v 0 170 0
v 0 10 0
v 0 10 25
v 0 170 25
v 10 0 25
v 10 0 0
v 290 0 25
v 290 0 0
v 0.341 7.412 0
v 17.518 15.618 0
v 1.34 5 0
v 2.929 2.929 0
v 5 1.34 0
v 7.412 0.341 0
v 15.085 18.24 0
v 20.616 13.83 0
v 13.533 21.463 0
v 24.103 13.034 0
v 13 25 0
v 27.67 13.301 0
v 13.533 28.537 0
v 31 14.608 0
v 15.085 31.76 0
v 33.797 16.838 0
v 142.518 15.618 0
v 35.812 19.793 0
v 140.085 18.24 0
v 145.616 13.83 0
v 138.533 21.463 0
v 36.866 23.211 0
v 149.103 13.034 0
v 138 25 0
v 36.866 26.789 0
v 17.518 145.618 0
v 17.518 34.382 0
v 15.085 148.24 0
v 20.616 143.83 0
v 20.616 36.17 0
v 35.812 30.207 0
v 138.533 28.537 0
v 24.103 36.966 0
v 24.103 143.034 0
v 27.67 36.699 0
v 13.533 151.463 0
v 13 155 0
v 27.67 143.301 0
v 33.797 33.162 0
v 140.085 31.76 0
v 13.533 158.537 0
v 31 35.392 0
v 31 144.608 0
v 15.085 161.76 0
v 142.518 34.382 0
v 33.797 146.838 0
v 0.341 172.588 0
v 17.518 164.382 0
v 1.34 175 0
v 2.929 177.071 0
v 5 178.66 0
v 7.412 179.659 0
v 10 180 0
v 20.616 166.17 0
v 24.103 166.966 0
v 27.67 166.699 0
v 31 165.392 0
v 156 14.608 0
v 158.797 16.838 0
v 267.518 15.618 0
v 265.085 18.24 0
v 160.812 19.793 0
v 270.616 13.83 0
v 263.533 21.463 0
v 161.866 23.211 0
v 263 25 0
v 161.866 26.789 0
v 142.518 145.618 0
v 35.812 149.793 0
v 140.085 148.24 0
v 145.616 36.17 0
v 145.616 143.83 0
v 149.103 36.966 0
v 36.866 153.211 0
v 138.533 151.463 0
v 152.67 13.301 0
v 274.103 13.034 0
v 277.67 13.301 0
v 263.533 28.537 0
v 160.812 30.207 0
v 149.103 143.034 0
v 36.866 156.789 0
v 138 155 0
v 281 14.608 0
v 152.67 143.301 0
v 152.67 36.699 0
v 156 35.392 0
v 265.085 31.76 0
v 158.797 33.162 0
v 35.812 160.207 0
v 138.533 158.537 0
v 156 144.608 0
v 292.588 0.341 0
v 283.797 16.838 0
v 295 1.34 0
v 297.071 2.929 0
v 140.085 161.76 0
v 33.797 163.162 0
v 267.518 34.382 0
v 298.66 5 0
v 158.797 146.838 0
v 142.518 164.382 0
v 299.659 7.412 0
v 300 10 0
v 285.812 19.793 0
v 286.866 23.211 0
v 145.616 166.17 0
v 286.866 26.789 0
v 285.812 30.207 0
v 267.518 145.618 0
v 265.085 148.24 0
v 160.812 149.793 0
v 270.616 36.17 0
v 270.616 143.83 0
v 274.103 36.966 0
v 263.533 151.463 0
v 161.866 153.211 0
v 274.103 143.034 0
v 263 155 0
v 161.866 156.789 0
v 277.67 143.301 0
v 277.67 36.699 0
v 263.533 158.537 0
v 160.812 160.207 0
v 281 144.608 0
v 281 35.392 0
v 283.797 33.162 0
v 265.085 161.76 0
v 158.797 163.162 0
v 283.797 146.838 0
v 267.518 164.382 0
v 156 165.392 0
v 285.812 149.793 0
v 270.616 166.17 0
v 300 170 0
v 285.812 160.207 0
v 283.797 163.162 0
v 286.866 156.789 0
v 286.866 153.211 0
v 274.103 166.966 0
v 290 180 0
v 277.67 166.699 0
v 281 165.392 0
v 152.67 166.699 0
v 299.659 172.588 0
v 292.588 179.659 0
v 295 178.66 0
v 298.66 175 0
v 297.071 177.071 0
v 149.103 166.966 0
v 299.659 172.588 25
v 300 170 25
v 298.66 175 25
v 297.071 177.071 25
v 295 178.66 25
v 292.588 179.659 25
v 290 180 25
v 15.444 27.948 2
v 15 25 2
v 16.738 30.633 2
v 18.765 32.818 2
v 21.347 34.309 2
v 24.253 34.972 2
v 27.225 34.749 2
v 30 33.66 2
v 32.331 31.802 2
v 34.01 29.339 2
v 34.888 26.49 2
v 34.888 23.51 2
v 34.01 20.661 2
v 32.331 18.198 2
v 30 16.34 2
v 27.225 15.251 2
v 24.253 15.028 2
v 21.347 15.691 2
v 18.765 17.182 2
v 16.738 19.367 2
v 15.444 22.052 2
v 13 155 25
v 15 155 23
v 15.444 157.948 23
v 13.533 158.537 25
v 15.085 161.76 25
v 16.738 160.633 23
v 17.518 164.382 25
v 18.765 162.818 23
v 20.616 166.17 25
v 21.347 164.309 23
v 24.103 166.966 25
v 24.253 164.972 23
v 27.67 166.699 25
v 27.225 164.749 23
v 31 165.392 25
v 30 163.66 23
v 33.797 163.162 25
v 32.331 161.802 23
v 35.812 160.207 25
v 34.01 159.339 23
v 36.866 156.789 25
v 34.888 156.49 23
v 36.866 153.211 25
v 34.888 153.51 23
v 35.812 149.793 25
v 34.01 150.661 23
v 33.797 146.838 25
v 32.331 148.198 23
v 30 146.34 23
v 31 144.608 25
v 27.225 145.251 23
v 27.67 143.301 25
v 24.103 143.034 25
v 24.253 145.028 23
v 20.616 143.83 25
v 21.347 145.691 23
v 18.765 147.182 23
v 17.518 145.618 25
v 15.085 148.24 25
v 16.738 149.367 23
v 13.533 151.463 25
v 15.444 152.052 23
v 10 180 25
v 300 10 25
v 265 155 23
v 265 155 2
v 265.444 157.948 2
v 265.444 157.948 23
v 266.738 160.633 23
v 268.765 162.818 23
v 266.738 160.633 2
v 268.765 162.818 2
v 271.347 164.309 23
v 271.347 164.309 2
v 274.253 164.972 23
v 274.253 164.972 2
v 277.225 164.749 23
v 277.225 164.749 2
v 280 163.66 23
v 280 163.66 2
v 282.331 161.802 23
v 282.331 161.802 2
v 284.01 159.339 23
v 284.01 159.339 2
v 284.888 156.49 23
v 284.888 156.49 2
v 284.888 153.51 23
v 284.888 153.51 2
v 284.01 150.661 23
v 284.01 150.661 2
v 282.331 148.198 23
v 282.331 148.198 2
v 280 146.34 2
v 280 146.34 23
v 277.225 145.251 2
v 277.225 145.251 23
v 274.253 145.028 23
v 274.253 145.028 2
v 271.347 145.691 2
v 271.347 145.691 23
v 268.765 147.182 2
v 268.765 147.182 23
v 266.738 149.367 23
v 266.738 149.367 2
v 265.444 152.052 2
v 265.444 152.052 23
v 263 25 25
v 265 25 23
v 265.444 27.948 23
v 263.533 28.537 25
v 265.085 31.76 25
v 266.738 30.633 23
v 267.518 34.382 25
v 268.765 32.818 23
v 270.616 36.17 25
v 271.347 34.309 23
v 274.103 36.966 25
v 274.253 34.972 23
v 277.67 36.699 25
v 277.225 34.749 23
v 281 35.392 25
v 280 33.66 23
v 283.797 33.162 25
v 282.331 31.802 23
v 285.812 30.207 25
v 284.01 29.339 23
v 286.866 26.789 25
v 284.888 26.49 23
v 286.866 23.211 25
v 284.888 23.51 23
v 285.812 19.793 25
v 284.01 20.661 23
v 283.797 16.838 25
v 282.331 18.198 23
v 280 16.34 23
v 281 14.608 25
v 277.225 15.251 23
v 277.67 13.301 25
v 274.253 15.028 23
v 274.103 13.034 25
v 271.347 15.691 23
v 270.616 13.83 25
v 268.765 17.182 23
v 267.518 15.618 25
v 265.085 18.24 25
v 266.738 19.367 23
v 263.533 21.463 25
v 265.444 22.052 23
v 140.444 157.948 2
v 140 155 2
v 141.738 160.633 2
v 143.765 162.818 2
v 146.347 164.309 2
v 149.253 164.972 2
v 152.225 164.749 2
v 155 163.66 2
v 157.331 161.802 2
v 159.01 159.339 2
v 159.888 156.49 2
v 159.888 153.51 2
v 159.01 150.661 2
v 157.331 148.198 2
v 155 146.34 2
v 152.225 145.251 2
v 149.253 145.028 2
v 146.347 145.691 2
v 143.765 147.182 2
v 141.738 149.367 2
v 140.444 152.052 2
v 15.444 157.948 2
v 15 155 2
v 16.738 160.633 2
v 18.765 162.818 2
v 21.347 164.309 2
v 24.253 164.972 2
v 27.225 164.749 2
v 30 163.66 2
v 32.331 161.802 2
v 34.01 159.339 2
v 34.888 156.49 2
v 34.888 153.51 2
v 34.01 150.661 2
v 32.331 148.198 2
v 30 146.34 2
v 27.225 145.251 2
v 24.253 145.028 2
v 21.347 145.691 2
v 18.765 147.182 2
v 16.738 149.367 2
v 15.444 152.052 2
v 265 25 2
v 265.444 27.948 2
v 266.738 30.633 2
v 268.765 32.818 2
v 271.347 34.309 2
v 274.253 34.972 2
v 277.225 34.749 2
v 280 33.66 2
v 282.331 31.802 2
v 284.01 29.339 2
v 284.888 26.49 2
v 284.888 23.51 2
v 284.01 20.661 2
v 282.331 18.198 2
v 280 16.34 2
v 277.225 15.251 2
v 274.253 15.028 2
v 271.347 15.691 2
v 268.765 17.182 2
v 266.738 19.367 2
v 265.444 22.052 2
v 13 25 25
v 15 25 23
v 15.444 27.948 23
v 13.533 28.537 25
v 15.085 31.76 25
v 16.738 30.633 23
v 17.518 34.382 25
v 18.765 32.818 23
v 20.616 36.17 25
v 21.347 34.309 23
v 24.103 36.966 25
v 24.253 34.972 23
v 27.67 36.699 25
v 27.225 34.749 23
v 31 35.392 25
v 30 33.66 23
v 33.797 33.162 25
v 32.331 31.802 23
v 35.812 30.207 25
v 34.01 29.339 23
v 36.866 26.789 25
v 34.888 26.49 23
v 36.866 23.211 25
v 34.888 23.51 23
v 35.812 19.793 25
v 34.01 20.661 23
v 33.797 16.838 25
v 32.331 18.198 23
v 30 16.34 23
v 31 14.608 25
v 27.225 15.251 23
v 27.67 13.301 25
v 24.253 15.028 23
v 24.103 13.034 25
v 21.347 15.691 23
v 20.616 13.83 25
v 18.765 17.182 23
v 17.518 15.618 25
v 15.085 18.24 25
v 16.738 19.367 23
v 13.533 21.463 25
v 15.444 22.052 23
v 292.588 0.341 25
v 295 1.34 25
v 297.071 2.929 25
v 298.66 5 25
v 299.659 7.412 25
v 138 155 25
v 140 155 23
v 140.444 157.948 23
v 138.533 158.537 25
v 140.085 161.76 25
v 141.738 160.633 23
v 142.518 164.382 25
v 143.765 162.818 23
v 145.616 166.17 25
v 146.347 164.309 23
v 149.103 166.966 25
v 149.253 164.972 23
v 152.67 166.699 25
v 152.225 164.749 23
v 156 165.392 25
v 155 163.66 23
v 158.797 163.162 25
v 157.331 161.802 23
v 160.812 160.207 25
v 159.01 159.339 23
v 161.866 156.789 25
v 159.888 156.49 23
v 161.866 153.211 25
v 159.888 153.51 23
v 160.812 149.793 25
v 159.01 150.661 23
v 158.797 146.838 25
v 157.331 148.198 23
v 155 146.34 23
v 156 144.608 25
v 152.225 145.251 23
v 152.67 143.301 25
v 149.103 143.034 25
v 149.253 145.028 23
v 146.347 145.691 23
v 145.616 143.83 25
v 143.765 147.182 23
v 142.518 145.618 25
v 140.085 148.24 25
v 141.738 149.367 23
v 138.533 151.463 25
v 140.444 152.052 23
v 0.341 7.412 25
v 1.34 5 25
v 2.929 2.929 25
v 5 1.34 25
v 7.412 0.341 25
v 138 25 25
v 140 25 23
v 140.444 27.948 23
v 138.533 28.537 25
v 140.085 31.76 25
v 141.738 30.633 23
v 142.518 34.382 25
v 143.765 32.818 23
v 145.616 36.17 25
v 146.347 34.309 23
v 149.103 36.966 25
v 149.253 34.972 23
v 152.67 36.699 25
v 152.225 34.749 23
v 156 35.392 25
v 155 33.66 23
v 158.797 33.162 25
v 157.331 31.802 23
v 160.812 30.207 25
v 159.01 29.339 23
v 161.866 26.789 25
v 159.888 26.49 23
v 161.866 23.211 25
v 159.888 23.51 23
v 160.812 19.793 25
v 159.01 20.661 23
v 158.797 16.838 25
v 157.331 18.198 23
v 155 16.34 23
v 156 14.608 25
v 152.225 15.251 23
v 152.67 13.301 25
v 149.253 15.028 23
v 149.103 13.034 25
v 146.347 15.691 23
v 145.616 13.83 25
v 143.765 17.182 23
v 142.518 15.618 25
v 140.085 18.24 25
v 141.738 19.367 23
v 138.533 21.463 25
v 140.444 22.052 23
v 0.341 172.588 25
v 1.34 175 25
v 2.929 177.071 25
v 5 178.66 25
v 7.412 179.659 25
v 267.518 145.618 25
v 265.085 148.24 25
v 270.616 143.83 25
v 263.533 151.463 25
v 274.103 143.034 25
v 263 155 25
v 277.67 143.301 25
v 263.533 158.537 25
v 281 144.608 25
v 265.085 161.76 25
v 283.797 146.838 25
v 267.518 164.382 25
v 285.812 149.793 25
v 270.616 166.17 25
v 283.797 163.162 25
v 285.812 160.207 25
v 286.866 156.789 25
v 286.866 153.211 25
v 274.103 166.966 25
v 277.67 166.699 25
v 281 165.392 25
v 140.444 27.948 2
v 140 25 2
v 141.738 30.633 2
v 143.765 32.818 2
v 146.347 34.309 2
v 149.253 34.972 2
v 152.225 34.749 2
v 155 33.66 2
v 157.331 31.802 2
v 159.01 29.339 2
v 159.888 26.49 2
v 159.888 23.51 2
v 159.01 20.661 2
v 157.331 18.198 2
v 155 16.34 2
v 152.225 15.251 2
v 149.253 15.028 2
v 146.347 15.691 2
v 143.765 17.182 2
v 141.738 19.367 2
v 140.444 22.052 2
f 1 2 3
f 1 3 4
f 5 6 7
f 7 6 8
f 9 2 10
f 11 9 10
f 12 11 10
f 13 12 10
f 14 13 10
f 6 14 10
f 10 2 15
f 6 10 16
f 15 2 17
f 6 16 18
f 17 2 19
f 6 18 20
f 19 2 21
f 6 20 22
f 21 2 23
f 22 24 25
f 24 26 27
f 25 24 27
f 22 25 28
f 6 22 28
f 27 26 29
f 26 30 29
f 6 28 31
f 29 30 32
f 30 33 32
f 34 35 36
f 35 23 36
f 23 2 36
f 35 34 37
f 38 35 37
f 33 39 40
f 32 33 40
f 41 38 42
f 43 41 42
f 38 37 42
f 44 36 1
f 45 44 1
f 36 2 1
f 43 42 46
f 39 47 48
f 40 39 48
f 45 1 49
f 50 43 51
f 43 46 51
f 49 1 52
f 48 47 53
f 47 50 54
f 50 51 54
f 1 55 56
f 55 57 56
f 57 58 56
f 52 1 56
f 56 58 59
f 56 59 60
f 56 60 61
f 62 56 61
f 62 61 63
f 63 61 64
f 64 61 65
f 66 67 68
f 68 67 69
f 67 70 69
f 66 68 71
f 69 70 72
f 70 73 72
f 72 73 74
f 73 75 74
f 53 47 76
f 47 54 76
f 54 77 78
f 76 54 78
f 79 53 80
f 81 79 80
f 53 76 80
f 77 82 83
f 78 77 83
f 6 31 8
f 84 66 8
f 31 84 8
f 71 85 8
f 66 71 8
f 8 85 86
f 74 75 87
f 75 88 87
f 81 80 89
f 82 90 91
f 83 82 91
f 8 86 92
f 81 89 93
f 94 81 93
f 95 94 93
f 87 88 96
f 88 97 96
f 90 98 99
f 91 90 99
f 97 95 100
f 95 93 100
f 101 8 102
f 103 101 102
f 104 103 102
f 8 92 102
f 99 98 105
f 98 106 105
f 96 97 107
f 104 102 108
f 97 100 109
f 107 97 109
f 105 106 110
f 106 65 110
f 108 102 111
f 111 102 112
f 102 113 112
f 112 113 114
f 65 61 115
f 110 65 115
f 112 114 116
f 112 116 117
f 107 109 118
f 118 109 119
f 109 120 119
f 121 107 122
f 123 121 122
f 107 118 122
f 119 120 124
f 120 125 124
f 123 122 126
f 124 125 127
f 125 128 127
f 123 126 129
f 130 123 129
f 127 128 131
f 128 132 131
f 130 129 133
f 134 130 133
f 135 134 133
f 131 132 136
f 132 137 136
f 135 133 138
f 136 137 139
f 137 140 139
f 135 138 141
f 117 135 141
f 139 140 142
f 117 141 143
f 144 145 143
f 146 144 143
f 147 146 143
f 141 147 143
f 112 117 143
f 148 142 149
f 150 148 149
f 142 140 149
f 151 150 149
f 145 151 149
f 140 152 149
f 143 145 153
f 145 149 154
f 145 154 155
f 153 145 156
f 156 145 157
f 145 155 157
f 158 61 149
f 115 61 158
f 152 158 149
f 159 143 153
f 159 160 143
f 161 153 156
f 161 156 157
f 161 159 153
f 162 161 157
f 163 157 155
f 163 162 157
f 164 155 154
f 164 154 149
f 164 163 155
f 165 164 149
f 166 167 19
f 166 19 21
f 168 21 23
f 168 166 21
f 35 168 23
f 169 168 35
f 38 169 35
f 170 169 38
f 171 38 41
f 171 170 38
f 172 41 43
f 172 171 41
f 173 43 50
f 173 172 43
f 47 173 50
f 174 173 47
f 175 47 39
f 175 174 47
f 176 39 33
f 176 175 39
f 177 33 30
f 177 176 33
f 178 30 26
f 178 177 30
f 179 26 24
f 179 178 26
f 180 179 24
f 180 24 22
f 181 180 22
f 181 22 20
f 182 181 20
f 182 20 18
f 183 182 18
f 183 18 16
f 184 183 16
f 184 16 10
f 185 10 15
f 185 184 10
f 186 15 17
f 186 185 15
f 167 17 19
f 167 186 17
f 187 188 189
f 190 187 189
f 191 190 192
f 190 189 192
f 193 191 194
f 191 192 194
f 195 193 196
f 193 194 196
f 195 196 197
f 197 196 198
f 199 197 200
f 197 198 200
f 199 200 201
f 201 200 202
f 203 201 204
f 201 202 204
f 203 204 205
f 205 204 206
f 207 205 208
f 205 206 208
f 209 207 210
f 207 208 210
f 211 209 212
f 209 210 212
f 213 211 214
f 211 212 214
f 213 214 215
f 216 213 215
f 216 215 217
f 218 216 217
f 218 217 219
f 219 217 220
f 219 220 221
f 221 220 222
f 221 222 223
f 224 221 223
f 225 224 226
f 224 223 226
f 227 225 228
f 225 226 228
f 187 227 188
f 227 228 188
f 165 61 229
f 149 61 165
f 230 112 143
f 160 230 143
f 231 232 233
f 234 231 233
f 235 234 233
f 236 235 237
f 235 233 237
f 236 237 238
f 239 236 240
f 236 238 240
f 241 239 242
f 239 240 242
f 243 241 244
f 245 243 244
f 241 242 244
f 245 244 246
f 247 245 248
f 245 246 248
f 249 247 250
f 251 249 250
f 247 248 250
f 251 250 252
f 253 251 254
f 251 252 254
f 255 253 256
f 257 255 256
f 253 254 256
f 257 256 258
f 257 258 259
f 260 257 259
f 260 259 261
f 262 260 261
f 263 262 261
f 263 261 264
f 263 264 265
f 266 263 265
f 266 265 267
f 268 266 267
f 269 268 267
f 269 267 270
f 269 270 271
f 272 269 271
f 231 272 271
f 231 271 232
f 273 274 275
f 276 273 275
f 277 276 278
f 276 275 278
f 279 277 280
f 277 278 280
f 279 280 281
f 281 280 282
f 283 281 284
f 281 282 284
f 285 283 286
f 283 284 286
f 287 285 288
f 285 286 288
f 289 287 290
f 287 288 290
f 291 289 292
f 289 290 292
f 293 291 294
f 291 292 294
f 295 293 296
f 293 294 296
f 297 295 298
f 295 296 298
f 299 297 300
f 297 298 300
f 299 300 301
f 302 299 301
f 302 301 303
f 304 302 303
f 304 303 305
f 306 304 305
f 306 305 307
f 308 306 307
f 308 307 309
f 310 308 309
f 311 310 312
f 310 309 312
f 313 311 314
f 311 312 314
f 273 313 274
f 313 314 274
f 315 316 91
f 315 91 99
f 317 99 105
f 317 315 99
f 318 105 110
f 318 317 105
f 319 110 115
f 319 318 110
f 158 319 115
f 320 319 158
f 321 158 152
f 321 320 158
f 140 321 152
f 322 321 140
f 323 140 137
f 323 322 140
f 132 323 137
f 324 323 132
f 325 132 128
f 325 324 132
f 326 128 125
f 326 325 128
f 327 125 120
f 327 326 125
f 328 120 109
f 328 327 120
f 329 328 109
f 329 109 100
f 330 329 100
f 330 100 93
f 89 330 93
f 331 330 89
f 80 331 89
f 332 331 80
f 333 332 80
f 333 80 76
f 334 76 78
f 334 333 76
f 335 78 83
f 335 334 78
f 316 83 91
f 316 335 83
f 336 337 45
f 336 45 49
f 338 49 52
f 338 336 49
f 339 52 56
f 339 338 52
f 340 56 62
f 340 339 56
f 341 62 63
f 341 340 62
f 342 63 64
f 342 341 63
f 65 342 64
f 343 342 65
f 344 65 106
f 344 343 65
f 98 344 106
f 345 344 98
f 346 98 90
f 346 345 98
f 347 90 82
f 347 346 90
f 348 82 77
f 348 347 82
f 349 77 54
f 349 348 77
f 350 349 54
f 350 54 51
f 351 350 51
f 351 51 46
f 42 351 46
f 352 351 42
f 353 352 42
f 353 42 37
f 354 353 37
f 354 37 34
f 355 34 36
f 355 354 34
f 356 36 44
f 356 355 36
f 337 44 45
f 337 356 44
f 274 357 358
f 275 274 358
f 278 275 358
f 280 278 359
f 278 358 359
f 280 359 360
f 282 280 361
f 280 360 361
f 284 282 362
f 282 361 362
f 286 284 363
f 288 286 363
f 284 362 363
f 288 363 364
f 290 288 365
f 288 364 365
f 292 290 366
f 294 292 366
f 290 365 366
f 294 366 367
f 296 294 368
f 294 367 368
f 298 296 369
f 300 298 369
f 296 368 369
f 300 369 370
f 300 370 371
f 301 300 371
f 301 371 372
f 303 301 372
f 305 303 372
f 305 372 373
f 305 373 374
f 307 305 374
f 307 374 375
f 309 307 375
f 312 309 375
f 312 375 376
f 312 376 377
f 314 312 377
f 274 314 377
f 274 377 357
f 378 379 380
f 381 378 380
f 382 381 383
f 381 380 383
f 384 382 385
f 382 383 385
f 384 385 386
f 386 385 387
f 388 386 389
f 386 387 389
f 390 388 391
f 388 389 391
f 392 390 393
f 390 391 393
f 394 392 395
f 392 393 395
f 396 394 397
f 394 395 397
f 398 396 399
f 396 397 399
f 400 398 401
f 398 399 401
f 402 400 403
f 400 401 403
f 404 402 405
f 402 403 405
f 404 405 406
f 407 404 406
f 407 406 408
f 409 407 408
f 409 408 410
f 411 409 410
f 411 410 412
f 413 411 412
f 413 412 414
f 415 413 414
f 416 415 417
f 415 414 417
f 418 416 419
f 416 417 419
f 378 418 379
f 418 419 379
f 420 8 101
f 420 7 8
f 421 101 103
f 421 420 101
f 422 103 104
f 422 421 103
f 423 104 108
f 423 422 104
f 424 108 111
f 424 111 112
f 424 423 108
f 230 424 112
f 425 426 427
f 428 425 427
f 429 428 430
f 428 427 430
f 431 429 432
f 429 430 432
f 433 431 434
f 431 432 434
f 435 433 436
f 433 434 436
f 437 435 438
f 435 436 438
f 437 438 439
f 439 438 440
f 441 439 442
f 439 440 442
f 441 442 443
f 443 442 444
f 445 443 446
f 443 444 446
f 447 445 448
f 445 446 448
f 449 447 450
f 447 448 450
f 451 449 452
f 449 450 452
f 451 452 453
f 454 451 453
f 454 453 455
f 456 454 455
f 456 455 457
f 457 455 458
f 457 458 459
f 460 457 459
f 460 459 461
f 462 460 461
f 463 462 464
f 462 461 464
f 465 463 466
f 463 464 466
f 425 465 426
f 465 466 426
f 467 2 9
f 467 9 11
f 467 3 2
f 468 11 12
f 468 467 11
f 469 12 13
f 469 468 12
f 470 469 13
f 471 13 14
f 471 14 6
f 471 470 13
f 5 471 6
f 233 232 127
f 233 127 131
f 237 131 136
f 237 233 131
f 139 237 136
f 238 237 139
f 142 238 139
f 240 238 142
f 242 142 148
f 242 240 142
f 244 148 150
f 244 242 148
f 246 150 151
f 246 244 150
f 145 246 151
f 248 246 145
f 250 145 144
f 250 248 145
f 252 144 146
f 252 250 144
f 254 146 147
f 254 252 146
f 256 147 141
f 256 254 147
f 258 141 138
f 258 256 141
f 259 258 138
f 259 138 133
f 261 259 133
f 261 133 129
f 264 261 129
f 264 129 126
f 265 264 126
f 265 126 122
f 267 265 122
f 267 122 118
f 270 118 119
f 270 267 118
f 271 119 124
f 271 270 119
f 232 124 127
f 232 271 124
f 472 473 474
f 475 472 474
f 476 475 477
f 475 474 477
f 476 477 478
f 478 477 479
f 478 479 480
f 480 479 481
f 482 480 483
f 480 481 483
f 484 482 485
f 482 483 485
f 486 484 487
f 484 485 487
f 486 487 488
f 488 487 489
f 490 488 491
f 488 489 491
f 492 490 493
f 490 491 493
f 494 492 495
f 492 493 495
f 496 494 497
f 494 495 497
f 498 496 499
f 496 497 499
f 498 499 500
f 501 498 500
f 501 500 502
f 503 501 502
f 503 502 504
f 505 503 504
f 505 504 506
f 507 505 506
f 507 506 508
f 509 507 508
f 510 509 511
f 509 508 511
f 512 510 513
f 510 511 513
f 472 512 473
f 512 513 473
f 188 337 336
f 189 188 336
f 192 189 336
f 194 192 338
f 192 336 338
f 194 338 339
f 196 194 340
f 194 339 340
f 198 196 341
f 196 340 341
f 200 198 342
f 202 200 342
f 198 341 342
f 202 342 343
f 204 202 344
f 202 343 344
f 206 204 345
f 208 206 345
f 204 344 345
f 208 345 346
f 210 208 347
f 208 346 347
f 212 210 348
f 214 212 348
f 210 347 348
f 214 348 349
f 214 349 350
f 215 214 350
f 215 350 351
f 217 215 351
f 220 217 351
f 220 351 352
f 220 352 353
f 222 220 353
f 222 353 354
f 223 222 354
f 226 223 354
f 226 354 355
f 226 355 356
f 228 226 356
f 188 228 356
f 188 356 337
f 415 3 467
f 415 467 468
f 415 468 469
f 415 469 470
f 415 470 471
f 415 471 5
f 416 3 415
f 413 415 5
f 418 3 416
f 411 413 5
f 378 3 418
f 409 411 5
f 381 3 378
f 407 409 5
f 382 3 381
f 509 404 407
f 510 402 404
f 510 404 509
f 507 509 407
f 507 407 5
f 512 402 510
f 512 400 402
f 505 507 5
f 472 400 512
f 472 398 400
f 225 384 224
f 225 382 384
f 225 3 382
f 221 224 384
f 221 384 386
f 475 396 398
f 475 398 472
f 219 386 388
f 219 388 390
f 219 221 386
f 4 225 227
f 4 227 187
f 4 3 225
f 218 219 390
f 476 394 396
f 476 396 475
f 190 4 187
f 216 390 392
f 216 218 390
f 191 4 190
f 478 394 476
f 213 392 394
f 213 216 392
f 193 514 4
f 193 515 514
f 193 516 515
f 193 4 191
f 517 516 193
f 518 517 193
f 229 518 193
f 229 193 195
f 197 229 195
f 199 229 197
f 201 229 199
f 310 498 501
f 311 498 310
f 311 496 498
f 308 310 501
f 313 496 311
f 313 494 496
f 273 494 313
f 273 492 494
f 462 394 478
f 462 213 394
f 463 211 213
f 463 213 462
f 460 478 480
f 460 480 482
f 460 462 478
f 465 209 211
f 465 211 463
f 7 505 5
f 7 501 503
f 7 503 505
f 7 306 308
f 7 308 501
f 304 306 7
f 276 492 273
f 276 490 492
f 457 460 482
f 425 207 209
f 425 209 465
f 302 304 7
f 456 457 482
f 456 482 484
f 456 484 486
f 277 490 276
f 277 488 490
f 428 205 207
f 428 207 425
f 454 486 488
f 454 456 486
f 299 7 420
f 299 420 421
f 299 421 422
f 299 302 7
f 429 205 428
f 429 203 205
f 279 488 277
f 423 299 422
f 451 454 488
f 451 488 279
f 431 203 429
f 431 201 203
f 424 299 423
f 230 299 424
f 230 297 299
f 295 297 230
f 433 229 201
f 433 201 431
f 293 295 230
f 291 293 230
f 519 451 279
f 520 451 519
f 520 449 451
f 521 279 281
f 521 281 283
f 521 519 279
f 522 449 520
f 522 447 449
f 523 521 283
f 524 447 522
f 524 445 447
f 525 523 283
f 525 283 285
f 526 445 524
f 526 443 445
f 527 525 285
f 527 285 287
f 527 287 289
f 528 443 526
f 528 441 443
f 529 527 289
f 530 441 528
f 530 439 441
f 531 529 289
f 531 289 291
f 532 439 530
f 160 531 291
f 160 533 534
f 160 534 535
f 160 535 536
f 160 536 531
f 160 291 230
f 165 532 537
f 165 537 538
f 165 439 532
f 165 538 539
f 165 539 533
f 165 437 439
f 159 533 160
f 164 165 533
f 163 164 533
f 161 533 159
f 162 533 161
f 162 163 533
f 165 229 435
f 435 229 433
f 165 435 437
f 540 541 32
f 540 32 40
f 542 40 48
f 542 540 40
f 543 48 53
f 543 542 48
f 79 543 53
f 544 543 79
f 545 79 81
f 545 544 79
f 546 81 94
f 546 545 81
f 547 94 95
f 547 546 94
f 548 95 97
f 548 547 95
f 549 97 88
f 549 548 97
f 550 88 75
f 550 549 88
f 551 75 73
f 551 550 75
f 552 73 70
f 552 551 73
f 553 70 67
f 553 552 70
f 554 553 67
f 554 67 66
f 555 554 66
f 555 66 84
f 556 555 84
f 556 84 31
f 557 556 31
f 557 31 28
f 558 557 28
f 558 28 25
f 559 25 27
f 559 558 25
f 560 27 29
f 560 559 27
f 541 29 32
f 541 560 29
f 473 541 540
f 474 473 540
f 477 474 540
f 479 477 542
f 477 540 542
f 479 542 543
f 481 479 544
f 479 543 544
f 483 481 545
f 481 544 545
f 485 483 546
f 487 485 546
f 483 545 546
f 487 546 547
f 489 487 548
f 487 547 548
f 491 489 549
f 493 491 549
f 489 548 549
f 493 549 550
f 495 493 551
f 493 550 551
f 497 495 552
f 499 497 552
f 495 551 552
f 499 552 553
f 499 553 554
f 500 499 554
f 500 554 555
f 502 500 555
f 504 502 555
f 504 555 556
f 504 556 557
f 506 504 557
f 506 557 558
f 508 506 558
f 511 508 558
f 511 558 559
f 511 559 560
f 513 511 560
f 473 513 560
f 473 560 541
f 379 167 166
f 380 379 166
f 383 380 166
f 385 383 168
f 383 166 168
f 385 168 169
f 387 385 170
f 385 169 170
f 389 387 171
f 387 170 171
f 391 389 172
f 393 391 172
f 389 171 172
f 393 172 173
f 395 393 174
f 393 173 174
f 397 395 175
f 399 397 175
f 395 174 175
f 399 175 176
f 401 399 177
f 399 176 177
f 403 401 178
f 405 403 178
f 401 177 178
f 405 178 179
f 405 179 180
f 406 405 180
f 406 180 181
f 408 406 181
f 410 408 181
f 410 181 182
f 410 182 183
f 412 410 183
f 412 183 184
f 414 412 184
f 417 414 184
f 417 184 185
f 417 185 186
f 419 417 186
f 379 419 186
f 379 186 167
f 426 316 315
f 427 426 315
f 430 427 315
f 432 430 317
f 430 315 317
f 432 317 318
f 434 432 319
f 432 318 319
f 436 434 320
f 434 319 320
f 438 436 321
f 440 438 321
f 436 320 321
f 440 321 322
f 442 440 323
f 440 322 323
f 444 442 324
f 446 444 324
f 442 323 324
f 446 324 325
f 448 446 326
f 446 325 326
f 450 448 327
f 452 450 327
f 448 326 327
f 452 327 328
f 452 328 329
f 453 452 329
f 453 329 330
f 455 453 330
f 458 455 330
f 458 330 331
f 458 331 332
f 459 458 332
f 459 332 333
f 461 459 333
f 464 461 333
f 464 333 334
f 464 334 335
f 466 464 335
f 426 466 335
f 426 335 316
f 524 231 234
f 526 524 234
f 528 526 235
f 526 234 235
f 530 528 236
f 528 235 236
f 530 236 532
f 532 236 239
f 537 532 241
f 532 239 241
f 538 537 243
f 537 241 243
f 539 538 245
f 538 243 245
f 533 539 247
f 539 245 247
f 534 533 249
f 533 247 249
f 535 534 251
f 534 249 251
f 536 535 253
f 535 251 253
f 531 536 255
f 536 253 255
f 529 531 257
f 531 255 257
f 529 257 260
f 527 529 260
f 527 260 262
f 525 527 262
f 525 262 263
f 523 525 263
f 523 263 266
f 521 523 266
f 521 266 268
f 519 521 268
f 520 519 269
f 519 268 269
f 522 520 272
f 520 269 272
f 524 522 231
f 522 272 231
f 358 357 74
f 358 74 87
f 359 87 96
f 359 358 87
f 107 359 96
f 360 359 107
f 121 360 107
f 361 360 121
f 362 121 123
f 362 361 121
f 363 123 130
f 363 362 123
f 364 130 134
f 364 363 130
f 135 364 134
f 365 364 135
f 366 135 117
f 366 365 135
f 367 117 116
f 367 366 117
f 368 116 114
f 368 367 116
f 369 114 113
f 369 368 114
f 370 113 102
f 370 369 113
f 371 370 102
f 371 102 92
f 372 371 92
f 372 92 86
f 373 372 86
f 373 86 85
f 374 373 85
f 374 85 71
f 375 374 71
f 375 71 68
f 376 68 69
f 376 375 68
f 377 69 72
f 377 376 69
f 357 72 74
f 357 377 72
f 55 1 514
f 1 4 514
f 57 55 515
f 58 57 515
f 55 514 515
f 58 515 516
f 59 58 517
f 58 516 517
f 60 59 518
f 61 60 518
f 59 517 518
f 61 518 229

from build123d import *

# Parameters (mm, degrees)
SKETCH_1_W       = 300
SKETCH_1_H       = 180
EXTRUDE_1_DEPTH  = 25
FILLET_1_R       = 10
F_20_0MM_1_D     = 20
F_20_0MM_1_DEPTH = 59
F_20_0MM_1_TIP   = 6.00860619
F_20_0MM_2_D     = 20
F_20_0MM_2_DEPTH = 59
F_20_0MM_2_TIP   = 6.00860619
CHAMFER_1_SIZE   = 2


with BuildPart() as part:
    # 草圖1 → 填料-伸長1 (new body)
    with BuildSketch(Plane.XY):
        with Locations((150, 90)):
            Rectangle(SKETCH_1_W, SKETCH_1_H)
    extrude(amount=EXTRUDE_1_DEPTH)

    # 圓角1
    fillet_1_edges = [part.edges().sort_by_distance(p)[0] for p in [
        (0, 180, 12.5),
        (300, 180, 12.5),
        (300, 0, 12.5),
        (0, 0, 12.5),
    ]]
    fillet(fillet_1_edges, radius=FILLET_1_R)

    # Ø20.0mm 定位孔1
    with Locations(Plane(origin=(25, 25, 25), x_dir=(1, 0, 0), z_dir=(0, 0, 1))):
        with Locations((0, 0), (0, 130), (125, 130), (250, 0), (250, 130)):
            Hole(F_20_0MM_1_D / 2, depth=F_20_0MM_1_DEPTH)
            with Locations((0, 0, -(F_20_0MM_1_DEPTH + F_20_0MM_1_TIP / 2))):  # 118° drill point
                Cone(0, F_20_0MM_1_D / 2, F_20_0MM_1_TIP, mode=Mode.SUBTRACT)

    # Ø20.0mm 定位孔2
    with Locations(Plane(origin=(150, 25, 25), x_dir=(1, 0, 0), z_dir=(0, 0, 1))):
        with Locations((0, 0)):
            Hole(F_20_0MM_2_D / 2, depth=F_20_0MM_2_DEPTH)
            with Locations((0, 0, -(F_20_0MM_2_DEPTH + F_20_0MM_2_TIP / 2))):  # 118° drill point
                Cone(0, F_20_0MM_2_D / 2, F_20_0MM_2_TIP, mode=Mode.SUBTRACT)

    # 導角1
    chamfer_1_edges = [part.edges().sort_by_distance(p)[0] for p in [
        (285, 155, 0),
        (285, 155, 25),
        (285, 25, 0),
        (285, 25, 25),
        (160, 155, 0),
        (160, 155, 25),
        (35, 155, 0),
        (35, 155, 25),
        (35, 25, 0),
        (35, 25, 25),
        (160, 25, 0),
        (160, 25, 25),
    ]]
    chamfer(chamfer_1_edges, length=CHAMFER_1_SIZE)


solid = part.part
